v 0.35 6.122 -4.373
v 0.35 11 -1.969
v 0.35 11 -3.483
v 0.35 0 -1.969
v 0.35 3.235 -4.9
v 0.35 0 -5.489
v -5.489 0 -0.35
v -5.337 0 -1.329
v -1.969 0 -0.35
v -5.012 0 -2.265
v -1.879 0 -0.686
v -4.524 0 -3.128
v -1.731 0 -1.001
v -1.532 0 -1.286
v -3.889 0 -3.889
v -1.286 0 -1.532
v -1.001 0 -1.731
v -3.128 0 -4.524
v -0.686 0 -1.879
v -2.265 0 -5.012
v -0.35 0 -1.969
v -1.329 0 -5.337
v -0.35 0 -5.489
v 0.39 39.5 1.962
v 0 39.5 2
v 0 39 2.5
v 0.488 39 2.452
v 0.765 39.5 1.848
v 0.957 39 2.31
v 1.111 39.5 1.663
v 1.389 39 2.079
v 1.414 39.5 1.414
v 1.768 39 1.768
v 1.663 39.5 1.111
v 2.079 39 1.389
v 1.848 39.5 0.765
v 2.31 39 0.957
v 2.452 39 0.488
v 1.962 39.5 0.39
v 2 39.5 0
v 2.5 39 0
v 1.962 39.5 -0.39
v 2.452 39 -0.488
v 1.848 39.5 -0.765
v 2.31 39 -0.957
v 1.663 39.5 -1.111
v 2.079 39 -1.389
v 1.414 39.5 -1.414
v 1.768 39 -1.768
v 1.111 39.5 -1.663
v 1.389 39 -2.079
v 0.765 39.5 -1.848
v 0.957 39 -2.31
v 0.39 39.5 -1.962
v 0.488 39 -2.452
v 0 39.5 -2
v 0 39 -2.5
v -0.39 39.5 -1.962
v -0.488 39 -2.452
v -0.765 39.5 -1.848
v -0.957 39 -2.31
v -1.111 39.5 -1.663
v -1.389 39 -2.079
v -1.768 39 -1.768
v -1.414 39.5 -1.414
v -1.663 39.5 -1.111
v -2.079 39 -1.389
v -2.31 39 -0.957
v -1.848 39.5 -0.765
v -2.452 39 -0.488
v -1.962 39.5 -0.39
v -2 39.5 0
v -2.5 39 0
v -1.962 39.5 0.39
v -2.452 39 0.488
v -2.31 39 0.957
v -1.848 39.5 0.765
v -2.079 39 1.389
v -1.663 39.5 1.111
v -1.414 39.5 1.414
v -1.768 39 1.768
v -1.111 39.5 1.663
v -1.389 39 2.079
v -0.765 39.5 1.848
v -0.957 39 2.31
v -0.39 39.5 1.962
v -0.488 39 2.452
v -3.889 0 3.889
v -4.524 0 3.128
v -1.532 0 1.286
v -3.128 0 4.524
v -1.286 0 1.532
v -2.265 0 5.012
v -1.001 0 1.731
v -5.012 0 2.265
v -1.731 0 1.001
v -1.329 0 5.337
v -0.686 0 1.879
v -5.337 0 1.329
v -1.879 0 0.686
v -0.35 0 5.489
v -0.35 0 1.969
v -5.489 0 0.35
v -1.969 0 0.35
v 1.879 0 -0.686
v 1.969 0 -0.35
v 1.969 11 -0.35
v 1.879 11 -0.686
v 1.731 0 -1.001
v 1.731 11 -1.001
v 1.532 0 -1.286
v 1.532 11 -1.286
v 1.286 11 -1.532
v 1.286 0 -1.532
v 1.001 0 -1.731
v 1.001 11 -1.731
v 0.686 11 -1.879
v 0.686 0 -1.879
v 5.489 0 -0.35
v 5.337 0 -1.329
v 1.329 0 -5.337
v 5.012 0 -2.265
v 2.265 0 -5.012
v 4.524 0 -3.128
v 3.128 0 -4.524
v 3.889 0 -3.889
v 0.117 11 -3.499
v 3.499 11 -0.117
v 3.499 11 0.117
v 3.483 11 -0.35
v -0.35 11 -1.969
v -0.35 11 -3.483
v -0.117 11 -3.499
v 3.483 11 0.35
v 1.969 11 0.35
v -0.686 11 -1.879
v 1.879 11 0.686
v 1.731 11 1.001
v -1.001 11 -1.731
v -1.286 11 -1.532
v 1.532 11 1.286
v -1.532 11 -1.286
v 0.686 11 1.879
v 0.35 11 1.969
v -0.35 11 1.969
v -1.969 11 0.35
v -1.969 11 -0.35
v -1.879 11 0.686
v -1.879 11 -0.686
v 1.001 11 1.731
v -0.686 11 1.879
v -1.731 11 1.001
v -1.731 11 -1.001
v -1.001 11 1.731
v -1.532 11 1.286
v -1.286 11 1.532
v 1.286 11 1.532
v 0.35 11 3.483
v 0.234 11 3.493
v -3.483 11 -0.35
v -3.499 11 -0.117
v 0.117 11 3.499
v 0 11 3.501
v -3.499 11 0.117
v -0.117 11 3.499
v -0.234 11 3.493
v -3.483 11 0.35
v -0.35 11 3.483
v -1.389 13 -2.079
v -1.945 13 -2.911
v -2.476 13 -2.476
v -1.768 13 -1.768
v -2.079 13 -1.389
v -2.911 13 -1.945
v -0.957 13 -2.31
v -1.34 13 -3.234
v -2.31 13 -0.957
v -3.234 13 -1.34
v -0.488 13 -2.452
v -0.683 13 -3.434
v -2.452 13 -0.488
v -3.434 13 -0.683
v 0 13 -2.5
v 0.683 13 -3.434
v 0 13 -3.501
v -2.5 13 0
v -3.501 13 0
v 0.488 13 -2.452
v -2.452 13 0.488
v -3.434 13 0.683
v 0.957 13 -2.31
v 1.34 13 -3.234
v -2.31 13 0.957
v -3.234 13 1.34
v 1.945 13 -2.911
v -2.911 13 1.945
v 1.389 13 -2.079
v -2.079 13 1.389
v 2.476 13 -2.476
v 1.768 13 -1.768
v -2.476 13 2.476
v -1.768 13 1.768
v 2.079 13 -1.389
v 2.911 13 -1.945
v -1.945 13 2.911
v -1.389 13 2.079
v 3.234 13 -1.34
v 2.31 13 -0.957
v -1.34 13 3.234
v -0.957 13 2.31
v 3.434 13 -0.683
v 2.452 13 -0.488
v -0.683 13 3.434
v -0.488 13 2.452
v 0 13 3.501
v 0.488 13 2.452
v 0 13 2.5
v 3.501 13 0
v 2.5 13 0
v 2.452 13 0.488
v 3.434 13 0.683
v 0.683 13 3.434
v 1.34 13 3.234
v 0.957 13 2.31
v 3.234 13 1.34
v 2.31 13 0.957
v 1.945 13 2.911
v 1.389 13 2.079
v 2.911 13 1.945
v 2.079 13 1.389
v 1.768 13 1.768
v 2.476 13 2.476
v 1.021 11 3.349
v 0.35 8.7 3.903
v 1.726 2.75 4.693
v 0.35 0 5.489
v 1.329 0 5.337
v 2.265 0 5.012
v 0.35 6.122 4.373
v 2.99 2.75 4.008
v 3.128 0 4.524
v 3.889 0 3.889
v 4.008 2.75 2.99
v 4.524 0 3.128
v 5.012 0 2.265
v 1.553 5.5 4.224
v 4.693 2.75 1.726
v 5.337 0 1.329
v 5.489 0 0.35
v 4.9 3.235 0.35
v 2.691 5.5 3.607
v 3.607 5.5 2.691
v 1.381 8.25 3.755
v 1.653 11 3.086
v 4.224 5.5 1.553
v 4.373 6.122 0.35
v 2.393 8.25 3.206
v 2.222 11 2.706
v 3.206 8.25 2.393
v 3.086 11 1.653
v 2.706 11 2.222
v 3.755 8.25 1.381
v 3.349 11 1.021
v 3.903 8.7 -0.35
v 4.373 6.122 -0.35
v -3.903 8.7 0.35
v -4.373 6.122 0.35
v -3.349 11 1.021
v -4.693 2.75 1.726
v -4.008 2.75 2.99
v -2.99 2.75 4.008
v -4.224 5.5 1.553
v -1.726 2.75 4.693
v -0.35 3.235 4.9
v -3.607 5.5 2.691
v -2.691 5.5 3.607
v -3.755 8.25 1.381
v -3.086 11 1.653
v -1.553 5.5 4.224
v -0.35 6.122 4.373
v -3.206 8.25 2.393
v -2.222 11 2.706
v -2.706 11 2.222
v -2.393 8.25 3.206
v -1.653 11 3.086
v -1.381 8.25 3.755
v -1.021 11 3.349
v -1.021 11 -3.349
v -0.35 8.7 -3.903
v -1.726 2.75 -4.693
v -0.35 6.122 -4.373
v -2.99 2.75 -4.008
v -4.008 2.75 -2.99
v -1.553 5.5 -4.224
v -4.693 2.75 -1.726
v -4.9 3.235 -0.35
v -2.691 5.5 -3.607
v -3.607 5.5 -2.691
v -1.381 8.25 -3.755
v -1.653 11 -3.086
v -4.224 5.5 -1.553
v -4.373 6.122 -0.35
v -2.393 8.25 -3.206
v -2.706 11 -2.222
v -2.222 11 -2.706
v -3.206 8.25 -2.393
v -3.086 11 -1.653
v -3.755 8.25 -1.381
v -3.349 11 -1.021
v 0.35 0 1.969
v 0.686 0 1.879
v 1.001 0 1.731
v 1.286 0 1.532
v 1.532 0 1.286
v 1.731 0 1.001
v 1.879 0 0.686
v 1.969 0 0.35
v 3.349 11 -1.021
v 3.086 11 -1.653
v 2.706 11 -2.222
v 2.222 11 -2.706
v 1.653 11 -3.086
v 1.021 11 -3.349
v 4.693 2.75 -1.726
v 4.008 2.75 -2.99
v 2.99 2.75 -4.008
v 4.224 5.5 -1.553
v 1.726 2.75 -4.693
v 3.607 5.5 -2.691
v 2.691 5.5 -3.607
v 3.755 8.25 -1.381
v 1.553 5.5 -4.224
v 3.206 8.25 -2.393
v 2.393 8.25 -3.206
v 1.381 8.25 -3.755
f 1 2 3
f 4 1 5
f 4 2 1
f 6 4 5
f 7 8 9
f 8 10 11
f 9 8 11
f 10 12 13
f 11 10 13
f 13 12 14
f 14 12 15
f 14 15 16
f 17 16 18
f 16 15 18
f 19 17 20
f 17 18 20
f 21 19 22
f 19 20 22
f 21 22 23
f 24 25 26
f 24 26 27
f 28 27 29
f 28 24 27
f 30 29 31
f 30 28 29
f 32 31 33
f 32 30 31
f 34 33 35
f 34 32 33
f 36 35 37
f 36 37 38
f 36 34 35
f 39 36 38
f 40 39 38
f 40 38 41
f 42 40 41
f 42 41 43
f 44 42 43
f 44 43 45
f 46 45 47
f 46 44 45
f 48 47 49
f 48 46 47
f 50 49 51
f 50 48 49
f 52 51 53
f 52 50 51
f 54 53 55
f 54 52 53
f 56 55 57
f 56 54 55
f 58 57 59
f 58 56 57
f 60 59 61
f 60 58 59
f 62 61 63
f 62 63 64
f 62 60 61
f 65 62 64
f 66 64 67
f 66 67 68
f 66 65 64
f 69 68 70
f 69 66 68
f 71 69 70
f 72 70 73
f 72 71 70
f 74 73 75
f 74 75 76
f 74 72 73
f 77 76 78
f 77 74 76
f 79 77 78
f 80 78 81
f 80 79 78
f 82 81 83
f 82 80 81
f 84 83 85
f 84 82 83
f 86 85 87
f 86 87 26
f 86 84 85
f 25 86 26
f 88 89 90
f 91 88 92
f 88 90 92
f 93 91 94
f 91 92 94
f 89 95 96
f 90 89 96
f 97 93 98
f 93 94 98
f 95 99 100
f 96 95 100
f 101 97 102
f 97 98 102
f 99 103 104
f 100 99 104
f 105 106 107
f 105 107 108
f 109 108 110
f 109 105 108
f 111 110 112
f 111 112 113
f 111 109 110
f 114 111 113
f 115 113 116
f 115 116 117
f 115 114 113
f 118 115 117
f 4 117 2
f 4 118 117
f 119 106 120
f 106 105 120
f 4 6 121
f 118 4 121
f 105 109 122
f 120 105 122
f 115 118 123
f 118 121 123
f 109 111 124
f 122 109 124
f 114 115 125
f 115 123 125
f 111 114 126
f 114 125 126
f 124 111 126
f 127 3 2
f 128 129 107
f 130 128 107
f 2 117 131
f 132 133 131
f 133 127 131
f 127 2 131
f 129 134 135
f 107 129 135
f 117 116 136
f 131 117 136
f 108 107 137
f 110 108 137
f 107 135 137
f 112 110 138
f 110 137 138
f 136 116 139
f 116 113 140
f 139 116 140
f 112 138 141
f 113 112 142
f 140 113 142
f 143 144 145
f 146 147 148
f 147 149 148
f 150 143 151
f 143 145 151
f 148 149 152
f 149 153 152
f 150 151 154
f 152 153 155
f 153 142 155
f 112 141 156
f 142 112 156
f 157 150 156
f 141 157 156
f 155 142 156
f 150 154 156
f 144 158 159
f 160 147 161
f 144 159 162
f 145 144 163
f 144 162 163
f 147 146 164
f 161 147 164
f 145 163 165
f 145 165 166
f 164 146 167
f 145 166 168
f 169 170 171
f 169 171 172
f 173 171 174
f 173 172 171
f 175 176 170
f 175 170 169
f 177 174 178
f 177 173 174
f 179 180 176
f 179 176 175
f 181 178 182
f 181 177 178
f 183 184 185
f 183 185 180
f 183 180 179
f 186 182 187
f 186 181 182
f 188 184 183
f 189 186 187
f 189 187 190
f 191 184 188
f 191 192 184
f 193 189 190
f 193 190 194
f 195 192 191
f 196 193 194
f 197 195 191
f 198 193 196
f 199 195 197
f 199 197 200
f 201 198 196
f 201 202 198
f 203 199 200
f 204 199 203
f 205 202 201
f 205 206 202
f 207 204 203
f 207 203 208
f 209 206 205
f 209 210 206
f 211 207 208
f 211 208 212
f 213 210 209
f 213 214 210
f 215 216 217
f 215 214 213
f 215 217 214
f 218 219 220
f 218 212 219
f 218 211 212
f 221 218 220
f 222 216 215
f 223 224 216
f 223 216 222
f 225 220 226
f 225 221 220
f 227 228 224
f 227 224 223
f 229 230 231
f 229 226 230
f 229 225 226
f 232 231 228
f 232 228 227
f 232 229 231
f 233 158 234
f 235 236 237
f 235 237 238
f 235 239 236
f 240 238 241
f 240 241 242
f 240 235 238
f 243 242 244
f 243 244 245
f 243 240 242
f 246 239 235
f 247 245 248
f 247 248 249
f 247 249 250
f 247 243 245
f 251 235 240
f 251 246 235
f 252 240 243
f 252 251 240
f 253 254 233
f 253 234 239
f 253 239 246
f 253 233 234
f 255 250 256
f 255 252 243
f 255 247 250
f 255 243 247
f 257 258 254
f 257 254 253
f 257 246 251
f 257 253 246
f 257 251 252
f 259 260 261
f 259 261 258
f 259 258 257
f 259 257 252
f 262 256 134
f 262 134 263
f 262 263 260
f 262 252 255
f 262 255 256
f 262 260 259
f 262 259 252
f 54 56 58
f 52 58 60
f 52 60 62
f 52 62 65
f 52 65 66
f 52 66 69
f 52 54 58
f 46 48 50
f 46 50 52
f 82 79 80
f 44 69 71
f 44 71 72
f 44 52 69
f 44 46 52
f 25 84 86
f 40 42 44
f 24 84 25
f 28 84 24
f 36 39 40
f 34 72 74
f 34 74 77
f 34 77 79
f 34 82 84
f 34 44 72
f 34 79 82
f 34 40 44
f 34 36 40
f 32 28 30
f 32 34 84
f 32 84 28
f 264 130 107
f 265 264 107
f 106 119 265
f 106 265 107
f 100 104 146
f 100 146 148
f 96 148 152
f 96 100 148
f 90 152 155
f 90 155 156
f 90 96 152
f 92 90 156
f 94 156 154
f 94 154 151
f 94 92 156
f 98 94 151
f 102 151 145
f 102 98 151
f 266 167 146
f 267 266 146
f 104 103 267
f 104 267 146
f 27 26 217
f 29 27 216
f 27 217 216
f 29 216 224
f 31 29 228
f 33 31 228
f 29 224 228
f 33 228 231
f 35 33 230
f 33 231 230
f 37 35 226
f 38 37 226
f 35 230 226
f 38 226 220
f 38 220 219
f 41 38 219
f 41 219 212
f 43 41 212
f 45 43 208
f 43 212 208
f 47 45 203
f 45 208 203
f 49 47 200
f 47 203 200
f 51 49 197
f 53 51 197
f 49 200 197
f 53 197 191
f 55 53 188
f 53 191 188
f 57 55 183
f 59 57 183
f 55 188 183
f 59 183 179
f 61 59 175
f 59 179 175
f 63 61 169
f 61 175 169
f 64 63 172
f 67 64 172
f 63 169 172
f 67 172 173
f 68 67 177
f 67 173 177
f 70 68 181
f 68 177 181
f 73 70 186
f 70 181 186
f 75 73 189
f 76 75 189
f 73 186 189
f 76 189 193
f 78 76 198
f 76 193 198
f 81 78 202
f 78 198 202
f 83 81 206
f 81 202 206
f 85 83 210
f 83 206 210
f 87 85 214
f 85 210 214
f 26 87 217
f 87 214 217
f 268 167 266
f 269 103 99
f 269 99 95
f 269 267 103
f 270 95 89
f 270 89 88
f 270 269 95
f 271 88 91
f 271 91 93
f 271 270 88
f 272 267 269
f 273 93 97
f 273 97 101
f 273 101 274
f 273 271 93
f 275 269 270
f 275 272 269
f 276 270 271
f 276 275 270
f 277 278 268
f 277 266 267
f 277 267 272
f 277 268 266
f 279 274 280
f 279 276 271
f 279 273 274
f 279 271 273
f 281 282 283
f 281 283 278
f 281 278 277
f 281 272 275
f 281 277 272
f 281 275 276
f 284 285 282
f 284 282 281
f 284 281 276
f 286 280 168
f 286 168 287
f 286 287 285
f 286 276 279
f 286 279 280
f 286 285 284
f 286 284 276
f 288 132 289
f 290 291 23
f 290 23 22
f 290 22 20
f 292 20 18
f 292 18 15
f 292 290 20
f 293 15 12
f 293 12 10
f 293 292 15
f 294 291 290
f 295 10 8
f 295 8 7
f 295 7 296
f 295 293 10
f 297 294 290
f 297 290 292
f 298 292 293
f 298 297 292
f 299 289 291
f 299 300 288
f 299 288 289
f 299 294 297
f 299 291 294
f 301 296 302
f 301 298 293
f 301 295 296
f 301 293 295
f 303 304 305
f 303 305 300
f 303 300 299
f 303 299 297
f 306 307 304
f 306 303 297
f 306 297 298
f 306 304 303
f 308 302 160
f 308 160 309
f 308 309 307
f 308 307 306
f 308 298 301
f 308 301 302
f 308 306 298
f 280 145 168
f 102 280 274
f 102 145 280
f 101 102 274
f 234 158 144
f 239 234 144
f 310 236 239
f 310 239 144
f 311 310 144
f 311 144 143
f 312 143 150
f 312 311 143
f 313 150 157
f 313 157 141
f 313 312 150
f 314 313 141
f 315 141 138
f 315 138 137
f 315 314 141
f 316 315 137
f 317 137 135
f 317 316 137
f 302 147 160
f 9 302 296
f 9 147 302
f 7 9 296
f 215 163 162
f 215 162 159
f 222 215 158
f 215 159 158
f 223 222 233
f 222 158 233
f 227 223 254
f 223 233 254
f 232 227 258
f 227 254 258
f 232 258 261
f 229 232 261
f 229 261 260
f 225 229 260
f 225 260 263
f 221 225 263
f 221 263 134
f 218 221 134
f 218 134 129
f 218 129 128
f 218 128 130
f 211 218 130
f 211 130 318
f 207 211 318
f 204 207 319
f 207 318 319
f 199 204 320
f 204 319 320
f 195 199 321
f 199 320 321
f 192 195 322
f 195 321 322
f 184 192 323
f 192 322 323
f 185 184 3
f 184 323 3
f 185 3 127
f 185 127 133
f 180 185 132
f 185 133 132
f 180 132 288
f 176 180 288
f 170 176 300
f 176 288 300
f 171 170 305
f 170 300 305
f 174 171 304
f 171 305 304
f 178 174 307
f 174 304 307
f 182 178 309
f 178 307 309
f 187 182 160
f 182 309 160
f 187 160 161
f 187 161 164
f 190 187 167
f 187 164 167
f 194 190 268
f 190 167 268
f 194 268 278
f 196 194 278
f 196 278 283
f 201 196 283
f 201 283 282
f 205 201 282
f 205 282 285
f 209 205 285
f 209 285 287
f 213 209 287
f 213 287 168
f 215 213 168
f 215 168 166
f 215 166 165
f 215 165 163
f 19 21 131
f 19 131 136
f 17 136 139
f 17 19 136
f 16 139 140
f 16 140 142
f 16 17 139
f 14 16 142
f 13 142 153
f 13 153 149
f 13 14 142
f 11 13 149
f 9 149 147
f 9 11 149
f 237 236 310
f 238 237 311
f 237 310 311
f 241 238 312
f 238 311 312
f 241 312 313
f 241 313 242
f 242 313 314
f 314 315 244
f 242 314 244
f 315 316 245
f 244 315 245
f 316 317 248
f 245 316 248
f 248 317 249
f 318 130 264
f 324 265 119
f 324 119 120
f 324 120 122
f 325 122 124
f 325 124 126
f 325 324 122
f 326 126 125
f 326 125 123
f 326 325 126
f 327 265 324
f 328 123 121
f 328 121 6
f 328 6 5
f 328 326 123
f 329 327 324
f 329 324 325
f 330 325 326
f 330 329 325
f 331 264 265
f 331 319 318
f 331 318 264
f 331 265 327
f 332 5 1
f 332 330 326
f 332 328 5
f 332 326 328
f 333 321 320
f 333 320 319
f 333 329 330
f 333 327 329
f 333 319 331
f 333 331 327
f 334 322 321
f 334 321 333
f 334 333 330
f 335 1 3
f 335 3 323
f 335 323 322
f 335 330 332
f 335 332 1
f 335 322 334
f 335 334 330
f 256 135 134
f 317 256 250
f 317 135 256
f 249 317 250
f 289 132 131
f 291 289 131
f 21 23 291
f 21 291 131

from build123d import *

# Parameters (mm, degrees)
SKETCH1_R           = 5.5
BOSS_EXTRUDE1_DEPTH = 11
BOSS_EXTRUDE1_TAPER = 10.3
SKETCH2_R           = 3.500961199
BOSS_EXTRUDE2_DEPTH = 2
SKETCH3_R           = 2.5
BOSS_EXTRUDE3_DEPTH = 26.5
CHAMFER1_SIZE       = 0.5
CUT_EXTRUDE1_DEPTH  = 11


with BuildPart() as part:
    # Sketch1 → Boss-Extrude1 (new body)
    with BuildSketch(Plane(origin=(0, 0, 0), x_dir=(1, 0, 0), z_dir=(0, 1, 0))):
        Circle(SKETCH1_R)
    extrude(amount=BOSS_EXTRUDE1_DEPTH, taper=BOSS_EXTRUDE1_TAPER)

    # Sketch2 → Boss-Extrude2 (add)
    with BuildSketch(Plane(origin=(0, 11, 0), x_dir=(1, 0, 0), z_dir=(0, 1, 0))):
        with Locations(Location((0, 0, 0), (0, 0, 270))):
            Circle(SKETCH2_R)
    extrude(amount=BOSS_EXTRUDE2_DEPTH)

    # Sketch3 → Boss-Extrude3 (add)
    with BuildSketch(Plane(origin=(0, 13, 0), x_dir=(1, 0, 0), z_dir=(0, 1, 0))):
        with Locations(Location((0, 0, 0), (0, 0, 270))):
            Circle(SKETCH3_R)
    extrude(amount=BOSS_EXTRUDE3_DEPTH)

    # Chamfer1
    chamfer1_edges = [part.edges().sort_by_distance(p)[0] for p in [
        (0, 39.5, -2.5),
    ]]
    chamfer(chamfer1_edges, length=CHAMFER1_SIZE)

    # Sketch4 → Cut-Extrude1 (cut)
    with BuildSketch(Plane.XZ):
        with BuildLine():
            Line((0.35, 5.488852339), (0.35, 1.969136867))
            ThreePointArc((0.35, 1.969136867), (1.414213562, 1.414213562), (1.969136867, 0.35))
            Line((1.969136867, 0.35), (5.488852339, 0.35))
            ThreePointArc((5.488852339, 0.35), (5.5, 0), (5.488852339, -0.35))
            Line((5.488852339, -0.35), (1.969136867, -0.35))
            ThreePointArc((1.969136867, -0.35), (1.414213562, -1.414213562), (0.35, -1.969136867))
            Line((0.35, -1.969136867), (0.35, -5.488852339))
            ThreePointArc((0.35, -5.488852339), (0, -5.5), (-0.35, -5.488852339))
            Line((-0.35, -5.488852339), (-0.35, -1.969136867))
            ThreePointArc((-0.35, -1.969136867), (-1.414213562, -1.414213562), (-1.969136867, -0.35))
            Line((-1.969136867, -0.35), (-5.488852339, -0.35))
            ThreePointArc((-5.488852339, -0.35), (-5.5, 0), (-5.488852339, 0.35))
            Line((-5.488852339, 0.35), (-1.969136867, 0.35))
            ThreePointArc((-1.969136867, 0.35), (-1.414213562, 1.414213562), (-0.35, 1.969136867))
            Line((-0.35, 1.969136867), (-0.35, 5.488852339))
            ThreePointArc((-0.35, 5.488852339), (0, 5.5), (0.35, 5.488852339))
        make_face()
    extrude(amount=-CUT_EXTRUDE1_DEPTH, mode=Mode.SUBTRACT)


solid = part.part
